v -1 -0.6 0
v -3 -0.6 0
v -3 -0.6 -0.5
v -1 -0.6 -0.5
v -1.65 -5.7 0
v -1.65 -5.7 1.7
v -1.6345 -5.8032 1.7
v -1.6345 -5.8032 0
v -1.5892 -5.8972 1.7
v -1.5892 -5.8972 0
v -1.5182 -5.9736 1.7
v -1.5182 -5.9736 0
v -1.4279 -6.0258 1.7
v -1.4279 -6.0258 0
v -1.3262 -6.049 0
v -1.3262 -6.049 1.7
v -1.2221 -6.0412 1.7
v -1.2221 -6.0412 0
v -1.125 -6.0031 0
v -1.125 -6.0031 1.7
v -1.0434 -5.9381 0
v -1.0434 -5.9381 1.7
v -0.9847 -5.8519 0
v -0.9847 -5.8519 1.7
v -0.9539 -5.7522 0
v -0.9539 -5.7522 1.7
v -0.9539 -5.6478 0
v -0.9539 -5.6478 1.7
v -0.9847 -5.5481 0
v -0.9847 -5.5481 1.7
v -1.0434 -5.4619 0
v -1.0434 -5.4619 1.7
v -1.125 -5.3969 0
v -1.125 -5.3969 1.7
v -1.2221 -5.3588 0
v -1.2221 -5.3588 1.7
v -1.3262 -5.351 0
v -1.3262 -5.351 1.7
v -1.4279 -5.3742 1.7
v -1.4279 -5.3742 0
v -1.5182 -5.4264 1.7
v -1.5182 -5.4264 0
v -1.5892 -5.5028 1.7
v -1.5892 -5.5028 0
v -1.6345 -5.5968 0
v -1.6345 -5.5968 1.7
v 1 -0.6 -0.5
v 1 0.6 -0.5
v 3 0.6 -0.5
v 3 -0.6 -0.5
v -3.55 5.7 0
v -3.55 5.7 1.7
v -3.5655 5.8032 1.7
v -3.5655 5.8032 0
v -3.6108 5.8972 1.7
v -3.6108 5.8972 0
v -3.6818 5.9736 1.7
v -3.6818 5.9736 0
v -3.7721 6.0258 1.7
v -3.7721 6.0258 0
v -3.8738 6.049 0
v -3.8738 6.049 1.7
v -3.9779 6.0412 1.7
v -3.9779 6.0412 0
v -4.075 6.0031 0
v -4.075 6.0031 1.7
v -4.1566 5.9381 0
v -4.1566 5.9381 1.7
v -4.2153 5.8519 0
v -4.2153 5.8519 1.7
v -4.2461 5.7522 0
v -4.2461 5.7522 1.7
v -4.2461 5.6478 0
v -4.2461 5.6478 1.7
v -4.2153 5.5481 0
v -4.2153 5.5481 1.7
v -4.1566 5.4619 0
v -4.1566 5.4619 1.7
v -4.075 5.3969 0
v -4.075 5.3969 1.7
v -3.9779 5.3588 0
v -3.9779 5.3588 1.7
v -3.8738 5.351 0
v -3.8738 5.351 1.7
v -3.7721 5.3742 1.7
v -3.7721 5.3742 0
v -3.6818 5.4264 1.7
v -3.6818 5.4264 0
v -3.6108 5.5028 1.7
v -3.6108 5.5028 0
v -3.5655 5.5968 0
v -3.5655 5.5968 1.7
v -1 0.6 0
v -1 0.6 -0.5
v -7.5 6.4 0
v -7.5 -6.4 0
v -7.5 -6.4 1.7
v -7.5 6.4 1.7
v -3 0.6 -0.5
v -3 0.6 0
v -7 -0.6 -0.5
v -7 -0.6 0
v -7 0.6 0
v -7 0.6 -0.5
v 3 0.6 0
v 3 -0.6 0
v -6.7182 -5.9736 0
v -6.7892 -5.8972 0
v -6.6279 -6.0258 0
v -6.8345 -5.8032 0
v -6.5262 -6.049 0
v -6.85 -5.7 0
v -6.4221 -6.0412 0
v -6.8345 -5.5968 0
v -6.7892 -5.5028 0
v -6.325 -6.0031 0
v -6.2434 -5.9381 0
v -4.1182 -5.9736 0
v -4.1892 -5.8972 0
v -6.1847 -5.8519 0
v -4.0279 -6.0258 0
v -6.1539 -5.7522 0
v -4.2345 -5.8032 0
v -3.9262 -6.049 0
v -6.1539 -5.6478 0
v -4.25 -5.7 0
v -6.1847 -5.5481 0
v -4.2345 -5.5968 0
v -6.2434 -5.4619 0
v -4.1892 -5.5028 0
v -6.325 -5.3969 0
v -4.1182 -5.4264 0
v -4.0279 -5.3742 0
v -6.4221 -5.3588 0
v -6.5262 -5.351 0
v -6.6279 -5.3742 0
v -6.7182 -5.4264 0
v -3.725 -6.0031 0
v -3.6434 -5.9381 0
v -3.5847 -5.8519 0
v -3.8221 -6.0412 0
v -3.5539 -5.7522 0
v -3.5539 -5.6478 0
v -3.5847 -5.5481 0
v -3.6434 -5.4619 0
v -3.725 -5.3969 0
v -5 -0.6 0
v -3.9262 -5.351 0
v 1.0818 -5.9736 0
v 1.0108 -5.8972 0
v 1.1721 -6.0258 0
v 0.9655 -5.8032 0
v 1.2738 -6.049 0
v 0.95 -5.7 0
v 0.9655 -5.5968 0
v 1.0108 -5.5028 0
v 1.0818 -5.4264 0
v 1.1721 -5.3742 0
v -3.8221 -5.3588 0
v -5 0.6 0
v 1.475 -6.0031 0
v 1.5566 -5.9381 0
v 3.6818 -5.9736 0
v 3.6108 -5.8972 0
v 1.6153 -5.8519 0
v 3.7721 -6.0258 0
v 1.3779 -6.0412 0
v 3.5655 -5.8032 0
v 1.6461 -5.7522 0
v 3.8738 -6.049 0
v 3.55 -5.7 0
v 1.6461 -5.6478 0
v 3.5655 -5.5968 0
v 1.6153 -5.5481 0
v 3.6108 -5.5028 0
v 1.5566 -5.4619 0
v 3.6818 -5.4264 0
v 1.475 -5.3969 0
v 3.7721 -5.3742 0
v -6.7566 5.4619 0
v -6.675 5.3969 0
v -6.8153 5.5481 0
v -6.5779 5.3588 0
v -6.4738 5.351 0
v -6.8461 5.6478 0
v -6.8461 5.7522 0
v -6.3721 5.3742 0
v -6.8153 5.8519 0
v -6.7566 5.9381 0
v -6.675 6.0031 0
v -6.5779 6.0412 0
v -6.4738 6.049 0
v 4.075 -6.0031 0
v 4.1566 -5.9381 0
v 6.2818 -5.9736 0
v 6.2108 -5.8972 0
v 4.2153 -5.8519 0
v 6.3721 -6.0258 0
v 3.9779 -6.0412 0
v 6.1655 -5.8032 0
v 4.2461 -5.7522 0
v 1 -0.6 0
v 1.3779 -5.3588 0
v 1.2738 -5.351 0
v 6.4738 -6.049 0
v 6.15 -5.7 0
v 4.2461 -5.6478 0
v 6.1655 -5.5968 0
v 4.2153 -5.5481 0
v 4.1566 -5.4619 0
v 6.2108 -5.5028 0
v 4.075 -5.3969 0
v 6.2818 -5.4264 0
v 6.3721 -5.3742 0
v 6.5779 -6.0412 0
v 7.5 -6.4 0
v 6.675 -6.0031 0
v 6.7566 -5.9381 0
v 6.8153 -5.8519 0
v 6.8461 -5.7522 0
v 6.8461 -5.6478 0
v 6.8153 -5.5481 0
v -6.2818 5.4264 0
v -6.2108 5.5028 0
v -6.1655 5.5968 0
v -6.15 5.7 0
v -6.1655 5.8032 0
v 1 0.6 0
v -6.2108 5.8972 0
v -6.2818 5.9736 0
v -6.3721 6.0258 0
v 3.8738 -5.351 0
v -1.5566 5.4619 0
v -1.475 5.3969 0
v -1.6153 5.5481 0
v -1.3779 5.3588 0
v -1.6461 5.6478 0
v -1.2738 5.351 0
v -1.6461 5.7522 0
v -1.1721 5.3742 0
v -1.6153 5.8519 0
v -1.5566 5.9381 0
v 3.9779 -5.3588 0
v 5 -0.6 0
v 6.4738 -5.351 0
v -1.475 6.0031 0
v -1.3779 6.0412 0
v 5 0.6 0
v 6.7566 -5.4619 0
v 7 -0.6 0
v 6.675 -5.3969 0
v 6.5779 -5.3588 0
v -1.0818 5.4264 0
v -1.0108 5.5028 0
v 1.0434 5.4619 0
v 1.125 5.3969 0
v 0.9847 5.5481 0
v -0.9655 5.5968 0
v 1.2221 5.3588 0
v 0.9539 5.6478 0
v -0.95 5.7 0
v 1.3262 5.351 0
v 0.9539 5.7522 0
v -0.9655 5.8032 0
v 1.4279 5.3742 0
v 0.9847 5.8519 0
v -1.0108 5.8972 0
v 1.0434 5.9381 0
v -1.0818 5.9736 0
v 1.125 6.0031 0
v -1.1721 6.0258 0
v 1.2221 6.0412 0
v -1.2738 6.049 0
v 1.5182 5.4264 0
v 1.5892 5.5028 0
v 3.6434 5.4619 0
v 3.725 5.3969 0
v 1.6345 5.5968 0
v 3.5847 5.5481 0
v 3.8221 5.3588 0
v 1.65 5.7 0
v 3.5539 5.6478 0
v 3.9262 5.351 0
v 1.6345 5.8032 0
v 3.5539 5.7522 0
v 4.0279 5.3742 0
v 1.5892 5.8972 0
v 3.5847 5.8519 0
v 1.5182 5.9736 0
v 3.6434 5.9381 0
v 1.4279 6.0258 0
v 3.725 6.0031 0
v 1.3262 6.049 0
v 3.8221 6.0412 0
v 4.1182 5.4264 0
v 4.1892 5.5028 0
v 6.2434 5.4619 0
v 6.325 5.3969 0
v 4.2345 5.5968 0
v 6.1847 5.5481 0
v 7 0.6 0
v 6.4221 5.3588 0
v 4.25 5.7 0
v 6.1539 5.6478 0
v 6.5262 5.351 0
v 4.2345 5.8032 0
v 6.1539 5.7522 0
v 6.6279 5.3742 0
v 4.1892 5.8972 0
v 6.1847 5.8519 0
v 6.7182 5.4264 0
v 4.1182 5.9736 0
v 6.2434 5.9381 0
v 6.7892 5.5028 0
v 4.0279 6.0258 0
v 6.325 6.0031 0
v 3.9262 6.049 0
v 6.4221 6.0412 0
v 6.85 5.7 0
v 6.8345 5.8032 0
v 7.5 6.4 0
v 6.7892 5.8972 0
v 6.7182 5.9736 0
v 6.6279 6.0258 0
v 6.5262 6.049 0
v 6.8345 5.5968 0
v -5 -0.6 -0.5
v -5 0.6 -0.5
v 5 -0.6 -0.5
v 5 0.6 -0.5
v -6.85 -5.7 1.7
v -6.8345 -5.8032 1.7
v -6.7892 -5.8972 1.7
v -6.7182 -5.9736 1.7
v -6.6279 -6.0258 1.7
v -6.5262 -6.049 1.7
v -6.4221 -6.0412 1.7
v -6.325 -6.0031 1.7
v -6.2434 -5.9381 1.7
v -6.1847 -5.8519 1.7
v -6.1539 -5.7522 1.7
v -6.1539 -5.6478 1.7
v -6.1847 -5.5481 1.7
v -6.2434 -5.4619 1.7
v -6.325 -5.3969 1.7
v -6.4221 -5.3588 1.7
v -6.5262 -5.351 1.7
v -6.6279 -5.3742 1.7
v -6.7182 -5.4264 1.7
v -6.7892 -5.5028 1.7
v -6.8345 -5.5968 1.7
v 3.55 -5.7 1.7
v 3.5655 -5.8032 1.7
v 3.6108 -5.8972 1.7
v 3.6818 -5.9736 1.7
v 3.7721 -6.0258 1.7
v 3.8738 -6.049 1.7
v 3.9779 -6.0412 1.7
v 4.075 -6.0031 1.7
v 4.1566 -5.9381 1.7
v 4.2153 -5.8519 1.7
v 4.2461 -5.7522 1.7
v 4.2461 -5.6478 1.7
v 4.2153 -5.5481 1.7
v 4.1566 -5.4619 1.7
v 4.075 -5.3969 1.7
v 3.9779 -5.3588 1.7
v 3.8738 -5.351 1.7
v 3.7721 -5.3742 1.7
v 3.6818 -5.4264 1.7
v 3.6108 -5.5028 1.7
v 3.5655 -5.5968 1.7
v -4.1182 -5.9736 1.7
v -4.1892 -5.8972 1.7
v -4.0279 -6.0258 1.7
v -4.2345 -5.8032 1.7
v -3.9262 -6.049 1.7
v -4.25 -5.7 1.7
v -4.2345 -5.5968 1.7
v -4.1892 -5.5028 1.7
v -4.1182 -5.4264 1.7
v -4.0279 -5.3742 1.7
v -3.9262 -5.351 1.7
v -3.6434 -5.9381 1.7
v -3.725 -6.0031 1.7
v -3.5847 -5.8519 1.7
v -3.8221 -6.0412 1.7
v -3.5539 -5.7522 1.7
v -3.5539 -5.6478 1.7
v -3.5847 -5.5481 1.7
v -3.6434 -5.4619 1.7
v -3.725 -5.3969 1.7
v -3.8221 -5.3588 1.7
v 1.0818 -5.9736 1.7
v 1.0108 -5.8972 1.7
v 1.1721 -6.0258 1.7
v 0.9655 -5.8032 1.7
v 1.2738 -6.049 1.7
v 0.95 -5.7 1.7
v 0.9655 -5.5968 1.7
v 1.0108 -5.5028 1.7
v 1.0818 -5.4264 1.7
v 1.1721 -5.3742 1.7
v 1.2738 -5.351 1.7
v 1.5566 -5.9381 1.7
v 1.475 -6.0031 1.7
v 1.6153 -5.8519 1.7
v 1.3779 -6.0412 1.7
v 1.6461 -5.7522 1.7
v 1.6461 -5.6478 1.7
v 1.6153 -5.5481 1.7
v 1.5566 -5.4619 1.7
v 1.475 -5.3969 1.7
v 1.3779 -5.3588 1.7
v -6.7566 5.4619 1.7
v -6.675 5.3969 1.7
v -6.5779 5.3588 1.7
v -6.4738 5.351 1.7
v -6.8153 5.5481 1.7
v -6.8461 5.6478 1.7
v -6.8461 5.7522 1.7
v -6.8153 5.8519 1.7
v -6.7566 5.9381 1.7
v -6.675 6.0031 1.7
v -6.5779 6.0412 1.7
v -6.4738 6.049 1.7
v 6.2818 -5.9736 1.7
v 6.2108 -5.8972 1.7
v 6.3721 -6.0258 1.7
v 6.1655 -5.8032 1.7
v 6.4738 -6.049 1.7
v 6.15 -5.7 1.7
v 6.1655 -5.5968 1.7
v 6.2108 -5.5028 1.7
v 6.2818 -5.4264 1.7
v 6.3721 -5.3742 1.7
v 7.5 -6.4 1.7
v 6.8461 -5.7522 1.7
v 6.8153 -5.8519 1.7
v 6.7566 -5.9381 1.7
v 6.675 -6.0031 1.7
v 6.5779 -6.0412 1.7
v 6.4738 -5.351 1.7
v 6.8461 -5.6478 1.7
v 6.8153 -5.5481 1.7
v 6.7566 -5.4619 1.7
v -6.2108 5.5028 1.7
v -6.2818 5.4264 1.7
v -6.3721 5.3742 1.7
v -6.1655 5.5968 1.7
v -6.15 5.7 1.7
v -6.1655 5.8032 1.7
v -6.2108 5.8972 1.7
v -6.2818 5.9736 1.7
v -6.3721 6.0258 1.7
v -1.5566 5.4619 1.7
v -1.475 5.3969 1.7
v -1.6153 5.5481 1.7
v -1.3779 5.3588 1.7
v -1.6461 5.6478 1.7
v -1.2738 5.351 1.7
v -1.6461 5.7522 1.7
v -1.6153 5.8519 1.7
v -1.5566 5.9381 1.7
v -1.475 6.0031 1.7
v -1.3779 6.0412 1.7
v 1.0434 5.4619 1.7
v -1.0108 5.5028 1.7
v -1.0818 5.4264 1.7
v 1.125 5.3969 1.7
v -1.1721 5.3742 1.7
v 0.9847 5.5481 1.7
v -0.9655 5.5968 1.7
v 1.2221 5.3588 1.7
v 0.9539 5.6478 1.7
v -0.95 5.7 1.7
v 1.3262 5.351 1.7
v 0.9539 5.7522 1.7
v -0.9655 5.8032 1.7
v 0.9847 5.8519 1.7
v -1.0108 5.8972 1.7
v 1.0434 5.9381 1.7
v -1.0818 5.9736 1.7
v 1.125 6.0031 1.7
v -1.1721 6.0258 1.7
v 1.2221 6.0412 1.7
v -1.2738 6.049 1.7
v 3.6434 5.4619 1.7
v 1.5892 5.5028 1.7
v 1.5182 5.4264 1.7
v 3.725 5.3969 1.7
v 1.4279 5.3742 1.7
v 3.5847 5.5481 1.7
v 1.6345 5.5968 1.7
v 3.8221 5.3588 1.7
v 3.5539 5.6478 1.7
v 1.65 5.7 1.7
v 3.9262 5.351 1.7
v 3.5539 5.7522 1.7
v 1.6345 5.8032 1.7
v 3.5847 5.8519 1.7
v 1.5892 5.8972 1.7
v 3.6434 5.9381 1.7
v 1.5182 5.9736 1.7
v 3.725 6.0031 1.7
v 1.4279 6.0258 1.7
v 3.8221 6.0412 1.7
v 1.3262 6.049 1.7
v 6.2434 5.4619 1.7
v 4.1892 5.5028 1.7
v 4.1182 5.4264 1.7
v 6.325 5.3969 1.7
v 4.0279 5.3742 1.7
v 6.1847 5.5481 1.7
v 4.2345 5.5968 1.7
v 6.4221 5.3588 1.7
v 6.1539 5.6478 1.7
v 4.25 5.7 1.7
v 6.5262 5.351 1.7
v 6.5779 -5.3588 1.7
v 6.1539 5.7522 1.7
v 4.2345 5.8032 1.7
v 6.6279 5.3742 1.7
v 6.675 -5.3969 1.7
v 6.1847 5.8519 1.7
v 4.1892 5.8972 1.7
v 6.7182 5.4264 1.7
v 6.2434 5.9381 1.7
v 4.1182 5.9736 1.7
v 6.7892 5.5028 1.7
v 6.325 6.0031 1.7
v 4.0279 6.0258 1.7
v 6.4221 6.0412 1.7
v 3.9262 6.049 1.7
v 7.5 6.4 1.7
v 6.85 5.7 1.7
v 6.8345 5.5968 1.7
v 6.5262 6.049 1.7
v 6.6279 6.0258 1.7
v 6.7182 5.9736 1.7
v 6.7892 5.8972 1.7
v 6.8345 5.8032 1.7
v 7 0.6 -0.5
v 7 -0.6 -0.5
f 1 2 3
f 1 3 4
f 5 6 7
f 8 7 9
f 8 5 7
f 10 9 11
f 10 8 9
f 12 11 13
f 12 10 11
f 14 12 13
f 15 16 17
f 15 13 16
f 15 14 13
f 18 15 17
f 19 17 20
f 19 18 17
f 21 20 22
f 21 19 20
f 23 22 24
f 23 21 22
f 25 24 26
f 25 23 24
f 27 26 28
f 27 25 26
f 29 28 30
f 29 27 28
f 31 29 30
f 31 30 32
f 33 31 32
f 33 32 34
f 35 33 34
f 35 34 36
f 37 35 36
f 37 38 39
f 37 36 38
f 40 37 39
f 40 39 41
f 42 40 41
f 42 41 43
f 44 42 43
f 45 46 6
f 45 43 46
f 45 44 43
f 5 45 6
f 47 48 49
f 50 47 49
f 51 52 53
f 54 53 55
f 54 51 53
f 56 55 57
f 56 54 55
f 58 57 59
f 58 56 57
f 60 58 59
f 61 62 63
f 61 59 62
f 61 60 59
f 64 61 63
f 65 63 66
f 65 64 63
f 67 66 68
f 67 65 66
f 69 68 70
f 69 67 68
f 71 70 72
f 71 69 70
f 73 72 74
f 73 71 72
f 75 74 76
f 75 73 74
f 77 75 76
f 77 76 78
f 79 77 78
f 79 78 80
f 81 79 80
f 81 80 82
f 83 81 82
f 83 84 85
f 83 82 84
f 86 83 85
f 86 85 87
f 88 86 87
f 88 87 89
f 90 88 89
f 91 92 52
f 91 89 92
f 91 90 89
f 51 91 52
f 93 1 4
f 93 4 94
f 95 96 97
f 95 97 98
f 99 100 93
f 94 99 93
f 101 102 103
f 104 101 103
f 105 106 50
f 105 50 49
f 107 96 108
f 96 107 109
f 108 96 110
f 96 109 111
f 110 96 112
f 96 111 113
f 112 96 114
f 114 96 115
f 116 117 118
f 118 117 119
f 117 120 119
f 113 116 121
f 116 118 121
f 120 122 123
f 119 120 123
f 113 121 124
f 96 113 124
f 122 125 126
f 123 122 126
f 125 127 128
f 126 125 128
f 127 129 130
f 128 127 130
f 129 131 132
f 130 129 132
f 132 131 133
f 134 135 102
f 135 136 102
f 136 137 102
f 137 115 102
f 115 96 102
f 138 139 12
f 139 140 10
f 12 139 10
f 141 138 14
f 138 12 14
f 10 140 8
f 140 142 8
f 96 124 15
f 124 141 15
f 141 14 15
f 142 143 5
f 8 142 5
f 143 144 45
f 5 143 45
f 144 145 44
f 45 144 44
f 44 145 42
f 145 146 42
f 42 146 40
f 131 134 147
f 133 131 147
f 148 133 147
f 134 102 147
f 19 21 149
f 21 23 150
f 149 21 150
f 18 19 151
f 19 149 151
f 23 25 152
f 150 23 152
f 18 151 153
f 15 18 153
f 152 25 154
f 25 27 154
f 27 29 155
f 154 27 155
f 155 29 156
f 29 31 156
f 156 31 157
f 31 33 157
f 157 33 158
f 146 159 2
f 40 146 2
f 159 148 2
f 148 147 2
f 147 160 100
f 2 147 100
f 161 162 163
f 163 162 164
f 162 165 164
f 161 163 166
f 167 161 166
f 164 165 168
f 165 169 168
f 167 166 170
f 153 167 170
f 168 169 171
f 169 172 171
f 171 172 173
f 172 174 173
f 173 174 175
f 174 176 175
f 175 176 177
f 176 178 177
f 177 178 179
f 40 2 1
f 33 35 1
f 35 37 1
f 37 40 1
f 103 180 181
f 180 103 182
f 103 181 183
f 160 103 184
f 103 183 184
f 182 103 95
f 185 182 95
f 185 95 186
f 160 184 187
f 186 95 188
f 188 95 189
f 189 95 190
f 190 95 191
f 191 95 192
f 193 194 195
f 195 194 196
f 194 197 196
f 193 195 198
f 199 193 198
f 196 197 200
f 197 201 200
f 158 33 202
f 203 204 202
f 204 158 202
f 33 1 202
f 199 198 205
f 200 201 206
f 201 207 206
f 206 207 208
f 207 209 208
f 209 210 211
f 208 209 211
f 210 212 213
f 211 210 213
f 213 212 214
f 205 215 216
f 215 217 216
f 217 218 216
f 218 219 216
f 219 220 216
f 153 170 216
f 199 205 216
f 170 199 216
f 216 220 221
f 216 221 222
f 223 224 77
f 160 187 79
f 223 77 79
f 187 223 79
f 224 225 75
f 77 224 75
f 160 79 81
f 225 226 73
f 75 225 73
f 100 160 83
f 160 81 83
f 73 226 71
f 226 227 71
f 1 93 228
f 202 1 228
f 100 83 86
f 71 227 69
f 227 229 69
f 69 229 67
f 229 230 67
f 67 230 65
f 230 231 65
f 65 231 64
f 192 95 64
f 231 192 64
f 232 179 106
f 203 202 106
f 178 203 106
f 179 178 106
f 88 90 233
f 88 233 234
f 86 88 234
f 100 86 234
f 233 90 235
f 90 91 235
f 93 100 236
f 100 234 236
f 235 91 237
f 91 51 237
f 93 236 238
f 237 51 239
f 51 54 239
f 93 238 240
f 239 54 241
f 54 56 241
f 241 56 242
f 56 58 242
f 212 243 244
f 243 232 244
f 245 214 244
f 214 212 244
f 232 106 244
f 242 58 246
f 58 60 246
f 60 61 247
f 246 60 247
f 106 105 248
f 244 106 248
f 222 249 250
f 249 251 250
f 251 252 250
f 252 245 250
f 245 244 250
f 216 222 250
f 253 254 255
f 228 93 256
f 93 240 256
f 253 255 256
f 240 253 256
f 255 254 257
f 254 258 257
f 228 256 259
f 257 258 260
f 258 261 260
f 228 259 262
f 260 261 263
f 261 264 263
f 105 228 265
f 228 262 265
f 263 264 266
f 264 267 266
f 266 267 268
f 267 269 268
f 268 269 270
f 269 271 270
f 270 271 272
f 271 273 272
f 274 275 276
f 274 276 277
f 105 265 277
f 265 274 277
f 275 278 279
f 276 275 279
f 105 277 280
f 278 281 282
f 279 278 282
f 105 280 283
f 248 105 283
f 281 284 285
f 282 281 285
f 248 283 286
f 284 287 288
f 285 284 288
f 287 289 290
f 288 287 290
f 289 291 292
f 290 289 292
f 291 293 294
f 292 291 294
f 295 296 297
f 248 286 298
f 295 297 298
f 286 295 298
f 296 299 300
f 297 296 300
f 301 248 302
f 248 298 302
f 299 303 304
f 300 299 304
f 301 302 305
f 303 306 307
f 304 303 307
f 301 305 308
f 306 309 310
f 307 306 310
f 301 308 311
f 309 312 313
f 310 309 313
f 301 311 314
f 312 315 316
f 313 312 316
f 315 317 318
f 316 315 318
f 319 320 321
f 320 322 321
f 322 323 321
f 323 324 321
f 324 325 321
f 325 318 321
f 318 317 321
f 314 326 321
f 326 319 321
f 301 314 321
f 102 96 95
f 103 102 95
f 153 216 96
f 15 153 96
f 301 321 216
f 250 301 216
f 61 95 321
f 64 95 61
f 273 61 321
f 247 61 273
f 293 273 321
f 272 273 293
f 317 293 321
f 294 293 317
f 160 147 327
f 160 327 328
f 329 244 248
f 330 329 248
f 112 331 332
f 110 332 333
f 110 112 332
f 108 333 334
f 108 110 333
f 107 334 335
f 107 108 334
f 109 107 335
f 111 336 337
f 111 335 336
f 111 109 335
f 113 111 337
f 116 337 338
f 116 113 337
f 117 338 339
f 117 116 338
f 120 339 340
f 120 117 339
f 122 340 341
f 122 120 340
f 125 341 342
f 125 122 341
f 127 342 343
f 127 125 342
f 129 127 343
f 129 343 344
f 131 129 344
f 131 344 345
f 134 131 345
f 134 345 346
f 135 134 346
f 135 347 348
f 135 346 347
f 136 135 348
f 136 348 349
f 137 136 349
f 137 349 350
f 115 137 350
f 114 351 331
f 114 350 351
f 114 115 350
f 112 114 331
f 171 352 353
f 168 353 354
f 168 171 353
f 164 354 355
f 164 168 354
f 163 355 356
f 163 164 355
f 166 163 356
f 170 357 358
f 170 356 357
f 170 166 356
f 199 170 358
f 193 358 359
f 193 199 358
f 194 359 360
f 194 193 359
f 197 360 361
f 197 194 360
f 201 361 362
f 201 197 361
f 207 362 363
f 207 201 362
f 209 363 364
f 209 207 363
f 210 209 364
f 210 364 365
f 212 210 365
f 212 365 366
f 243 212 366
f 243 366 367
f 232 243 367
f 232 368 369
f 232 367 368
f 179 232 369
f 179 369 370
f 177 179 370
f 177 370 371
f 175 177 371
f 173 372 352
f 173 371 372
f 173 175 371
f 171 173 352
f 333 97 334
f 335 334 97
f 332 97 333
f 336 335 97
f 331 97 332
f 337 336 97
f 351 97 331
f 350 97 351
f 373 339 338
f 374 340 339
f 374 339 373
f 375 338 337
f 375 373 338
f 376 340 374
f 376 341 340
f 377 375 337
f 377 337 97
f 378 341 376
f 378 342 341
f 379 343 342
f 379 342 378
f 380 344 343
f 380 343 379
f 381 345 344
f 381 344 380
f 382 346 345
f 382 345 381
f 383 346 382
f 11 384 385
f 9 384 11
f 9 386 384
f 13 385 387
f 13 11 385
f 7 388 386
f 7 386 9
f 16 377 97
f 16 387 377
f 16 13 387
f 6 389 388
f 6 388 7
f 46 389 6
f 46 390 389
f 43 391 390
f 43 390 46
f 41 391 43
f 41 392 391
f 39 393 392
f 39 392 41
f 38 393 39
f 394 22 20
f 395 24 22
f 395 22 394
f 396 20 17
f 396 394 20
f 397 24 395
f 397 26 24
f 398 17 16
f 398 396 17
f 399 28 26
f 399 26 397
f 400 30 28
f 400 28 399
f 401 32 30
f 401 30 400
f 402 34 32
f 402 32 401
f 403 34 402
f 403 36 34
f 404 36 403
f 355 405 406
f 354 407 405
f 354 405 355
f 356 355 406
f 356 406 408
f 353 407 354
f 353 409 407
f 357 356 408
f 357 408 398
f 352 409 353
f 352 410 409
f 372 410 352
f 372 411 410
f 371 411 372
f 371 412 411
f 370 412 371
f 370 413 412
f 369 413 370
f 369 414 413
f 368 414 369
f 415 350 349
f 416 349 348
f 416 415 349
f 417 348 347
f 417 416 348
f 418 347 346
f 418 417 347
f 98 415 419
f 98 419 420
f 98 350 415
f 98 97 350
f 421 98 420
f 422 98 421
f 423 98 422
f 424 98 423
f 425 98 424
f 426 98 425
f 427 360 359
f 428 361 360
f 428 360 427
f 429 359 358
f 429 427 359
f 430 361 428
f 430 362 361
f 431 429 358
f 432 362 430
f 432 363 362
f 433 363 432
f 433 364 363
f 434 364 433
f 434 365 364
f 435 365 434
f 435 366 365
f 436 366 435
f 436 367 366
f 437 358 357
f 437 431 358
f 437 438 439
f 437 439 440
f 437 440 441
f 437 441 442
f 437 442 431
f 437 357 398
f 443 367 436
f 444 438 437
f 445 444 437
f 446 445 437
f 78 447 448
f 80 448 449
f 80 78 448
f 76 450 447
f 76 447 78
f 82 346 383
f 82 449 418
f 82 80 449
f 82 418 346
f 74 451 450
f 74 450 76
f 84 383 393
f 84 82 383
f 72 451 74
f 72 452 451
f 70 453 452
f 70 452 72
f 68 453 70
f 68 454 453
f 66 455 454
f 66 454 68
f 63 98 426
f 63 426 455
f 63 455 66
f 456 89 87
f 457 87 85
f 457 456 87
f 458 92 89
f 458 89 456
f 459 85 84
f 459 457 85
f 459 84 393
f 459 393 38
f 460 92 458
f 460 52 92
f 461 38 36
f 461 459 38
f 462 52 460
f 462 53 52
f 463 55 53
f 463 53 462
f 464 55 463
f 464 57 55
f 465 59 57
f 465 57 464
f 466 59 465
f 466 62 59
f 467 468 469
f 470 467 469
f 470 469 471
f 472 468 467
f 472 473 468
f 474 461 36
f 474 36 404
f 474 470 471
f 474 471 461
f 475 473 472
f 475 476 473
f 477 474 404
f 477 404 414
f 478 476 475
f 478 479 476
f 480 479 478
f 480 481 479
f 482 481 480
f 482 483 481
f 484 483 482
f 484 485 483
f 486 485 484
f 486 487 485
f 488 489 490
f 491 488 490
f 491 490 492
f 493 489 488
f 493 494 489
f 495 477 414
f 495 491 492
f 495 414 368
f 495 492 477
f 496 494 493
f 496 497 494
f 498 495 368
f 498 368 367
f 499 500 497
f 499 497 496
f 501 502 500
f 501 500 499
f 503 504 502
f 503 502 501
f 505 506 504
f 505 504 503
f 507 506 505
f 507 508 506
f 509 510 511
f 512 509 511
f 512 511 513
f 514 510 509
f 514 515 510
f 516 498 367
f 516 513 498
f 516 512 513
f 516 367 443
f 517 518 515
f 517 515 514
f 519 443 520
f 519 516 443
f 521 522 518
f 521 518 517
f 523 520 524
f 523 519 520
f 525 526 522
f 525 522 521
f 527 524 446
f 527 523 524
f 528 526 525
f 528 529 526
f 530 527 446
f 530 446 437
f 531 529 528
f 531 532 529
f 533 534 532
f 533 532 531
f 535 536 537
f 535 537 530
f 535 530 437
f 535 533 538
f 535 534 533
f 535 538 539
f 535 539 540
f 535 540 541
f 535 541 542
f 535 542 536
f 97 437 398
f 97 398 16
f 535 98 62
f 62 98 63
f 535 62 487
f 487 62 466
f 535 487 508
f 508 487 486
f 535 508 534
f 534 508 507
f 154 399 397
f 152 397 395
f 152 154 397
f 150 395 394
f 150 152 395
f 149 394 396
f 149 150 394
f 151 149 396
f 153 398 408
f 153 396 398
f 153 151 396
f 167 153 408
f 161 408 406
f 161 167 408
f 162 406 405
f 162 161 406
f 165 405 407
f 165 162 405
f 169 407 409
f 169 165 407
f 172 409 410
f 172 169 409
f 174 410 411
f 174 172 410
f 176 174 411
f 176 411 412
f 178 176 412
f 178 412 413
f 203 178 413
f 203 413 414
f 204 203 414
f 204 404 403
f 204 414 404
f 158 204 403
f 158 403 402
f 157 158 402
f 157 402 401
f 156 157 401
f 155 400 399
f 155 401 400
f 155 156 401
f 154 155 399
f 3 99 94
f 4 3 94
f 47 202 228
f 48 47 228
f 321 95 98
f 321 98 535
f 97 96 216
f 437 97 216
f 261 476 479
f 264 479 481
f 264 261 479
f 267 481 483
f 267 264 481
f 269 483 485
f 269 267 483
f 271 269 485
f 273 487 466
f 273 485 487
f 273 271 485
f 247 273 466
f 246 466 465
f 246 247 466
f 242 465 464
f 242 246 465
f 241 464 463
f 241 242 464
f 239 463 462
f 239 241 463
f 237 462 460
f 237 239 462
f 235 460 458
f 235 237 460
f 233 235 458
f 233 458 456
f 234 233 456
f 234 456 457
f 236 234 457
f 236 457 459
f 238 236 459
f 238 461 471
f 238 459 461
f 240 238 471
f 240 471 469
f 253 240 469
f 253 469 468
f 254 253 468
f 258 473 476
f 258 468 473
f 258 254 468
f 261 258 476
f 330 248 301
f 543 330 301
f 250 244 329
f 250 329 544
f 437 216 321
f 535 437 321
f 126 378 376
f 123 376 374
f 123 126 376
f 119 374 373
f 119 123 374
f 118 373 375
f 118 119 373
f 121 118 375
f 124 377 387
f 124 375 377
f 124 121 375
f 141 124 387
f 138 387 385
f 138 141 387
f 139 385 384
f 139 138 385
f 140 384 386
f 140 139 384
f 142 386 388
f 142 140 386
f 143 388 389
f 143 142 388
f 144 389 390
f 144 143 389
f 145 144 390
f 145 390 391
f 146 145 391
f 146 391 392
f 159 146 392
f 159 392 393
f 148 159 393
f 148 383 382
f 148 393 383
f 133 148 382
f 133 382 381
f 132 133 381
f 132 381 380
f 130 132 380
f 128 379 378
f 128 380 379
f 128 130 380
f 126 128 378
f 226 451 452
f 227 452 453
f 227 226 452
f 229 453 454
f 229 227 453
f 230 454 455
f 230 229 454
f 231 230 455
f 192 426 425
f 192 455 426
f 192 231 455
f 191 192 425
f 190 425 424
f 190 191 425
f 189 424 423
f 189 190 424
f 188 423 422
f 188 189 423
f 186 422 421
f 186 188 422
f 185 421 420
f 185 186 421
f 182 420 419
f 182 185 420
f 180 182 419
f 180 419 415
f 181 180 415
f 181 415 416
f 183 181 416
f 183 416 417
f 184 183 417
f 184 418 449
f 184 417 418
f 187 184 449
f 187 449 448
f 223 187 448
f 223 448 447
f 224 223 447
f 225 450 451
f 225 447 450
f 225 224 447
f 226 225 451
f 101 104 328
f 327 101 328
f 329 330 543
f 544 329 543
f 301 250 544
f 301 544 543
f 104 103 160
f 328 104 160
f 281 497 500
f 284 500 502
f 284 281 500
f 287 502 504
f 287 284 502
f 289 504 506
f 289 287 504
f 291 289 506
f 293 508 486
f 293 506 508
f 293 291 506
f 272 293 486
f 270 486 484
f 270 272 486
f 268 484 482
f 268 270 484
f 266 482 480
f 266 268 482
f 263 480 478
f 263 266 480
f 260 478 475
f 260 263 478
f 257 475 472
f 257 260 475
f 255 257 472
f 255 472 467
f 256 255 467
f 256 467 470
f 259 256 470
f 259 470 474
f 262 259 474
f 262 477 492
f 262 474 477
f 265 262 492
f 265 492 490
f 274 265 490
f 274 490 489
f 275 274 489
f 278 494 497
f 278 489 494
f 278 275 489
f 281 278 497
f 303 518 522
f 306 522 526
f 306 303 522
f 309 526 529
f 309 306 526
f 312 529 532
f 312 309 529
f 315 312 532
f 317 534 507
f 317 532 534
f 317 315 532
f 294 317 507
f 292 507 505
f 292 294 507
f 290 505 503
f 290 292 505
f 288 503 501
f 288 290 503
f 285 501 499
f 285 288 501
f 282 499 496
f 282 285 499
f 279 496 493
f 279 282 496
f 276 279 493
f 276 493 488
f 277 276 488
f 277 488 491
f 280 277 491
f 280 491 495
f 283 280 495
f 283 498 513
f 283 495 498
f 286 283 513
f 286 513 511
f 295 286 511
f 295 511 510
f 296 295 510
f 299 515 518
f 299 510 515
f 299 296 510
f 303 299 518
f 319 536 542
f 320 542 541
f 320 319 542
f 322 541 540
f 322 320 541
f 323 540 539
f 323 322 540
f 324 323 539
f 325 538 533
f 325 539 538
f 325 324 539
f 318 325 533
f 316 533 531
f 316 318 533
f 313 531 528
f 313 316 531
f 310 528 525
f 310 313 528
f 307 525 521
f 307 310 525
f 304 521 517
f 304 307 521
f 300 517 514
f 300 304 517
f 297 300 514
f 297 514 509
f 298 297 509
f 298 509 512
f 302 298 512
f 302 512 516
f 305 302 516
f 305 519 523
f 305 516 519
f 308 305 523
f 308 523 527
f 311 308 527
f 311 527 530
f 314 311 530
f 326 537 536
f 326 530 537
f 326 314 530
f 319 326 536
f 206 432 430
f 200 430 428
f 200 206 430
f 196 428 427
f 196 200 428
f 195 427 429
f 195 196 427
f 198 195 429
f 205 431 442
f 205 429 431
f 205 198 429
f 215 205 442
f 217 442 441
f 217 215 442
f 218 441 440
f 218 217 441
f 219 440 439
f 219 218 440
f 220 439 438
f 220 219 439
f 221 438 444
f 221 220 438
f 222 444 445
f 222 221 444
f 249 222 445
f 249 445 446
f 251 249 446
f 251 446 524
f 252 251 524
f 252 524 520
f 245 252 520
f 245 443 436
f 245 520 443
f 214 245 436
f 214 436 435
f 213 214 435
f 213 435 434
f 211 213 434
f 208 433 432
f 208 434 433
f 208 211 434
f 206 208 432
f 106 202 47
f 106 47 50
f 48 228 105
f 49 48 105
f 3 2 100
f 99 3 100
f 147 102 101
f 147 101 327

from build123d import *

# Parameters (mm, degrees)
SKETCH1_W           = 15
SKETCH1_H           = 12.8
BOSS_EXTRUDE1_DEPTH = 1.7
SKETCH1_3_W         = 2
SKETCH1_3_H         = 1.2
BOSS_EXTRUDE2_DEPTH = 0.5
SKETCH1_4_R         = 0.35
CUT_EXTRUDE1_DEPTH  = 11.004998751


with BuildPart() as part:
    # Sketch1 → Boss-Extrude1 (new body)
    with BuildSketch(Plane.XY):
        Rectangle(SKETCH1_W, SKETCH1_H)
    extrude(amount=BOSS_EXTRUDE1_DEPTH)

    # Sketch1<3> → Boss-Extrude2 (add)
    with BuildSketch(Plane.XY):
        with Locations((-2, 0)):
            Rectangle(SKETCH1_3_W, SKETCH1_3_H)
        with Locations((-6, 0)):
            Rectangle(SKETCH1_3_W, SKETCH1_3_H)
        with Locations((2, 0)):
            Rectangle(SKETCH1_3_W, SKETCH1_3_H)
        with Locations((6, 0)):
            Rectangle(SKETCH1_3_W, SKETCH1_3_H)
    extrude(amount=-BOSS_EXTRUDE2_DEPTH)

    # Sketch1<4> → Cut-Extrude1 (cut, through all)
    with BuildSketch(Plane.XY):
        with Locations((-6.5, 5.7)):
            Circle(SKETCH1_4_R)
        with Locations((-3.9, 5.7)):
            Circle(SKETCH1_4_R)
        with Locations((-1.3, 5.7)):
            Circle(SKETCH1_4_R)
        with Locations((1.3, 5.7)):
            Circle(SKETCH1_4_R)
        with Locations((3.9, 5.7)):
            Circle(SKETCH1_4_R)
        with Locations((6.5, 5.7)):
            Circle(SKETCH1_4_R)
        with Locations((-1.3, -5.7)):
            Circle(SKETCH1_4_R)
        with Locations((6.5, -5.7)):
            Circle(SKETCH1_4_R)
        with Locations((3.9, -5.7)):
            Circle(SKETCH1_4_R)
        with Locations((1.3, -5.7)):
            Circle(SKETCH1_4_R)
        with Locations((-3.9, -5.7)):
            Circle(SKETCH1_4_R)
        with Locations((-6.5, -5.7)):
            Circle(SKETCH1_4_R)
    extrude(amount=CUT_EXTRUDE1_DEPTH, mode=Mode.SUBTRACT)


solid = part.part
